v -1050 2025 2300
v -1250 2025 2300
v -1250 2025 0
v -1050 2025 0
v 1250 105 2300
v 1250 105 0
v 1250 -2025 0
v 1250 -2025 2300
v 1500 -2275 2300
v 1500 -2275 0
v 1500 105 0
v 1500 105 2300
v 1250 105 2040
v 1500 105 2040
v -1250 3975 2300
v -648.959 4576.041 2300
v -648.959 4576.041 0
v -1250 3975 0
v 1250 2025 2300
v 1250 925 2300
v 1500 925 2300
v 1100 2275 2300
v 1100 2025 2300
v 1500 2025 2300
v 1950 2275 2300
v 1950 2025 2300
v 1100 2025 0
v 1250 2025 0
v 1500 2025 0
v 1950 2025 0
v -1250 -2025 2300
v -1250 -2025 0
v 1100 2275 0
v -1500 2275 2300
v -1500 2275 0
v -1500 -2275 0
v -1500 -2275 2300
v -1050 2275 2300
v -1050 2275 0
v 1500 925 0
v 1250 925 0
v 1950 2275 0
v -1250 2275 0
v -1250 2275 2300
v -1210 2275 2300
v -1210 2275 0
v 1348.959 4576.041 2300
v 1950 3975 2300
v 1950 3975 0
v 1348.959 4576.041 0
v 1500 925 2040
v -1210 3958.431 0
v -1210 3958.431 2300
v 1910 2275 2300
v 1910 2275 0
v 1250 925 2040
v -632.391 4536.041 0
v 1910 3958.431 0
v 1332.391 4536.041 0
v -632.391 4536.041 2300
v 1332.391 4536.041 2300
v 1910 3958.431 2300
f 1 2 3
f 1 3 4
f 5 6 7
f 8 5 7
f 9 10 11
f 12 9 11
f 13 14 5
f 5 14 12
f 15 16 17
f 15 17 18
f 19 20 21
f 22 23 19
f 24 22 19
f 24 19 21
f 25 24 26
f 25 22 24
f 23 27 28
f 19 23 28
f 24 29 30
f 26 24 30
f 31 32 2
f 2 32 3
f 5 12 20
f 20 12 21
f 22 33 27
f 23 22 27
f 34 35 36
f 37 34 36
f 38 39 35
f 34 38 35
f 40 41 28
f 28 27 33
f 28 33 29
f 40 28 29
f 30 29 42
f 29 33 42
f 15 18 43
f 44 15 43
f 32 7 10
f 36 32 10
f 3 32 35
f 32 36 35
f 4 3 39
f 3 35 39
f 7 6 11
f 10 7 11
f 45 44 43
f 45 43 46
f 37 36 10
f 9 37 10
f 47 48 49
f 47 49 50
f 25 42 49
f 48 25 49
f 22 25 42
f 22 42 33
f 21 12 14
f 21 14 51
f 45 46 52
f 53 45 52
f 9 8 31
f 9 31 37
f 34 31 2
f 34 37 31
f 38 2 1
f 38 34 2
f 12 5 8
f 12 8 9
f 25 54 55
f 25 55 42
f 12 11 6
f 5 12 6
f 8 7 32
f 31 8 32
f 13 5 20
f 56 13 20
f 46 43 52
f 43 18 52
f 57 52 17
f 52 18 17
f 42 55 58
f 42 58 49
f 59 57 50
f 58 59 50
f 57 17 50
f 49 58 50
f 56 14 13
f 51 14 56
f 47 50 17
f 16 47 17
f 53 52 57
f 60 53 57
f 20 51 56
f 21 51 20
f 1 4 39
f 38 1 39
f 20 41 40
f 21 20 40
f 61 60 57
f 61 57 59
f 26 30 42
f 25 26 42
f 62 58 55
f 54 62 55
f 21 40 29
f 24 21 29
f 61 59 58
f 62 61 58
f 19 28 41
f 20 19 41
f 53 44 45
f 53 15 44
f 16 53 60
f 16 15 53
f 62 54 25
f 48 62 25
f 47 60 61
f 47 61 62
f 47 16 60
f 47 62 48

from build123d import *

# Parameters (mm, degrees)
F1_DEPTH = 2300
F2_W     = 820
F2_H     = 260
F3_DEPTH = 250
F4_DEPTH = 2300


with BuildPart() as f1:
    # F0 (on Top) → F1 (new body)
    with BuildSketch(Plane.XY):
        Polygon((-1250, -2025), (-1250, 2025), (-1050, 2025), (-1050, 2275), (-1210, 2275), (-1250, 2275), (-1500, 2275), (-1500, -2275), (1500, -2275), (1500, 105), (1250, 105), (1250, -2025), align=None)
        Polygon((1100, 2275), (1100, 2025), (1250, 2025), (1250, 925), (1500, 925), (1500, 2025), (1950, 2025), (1950, 2275), (1910, 2275), (1500, 2275), align=None)
    extrude(amount=F1_DEPTH)


with BuildPart() as f3:
    # F2 (on face) → F3 (new body, through all)
    with BuildSketch(Plane.YZ.offset(1500)):
        with Locations((515, 2170)):
            Rectangle(F2_W, F2_H)
    extrude(amount=-F3_DEPTH)


with BuildPart() as f4:
    # F0 (on Top) → F4 (new body)
    with BuildSketch(Plane.XY):
        Polygon((-1250, 2275), (-1210, 2275), (-1210, 3958.431458), (-632.390693, 4536.040764), (1332.390693, 4536.040764), (1910, 3958.431458), (1910, 2275), (1950, 2275), (1950, 3975), (1348.959236, 4576.040764), (-648.959236, 4576.040764), (-1250, 3975), align=None)
    extrude(amount=F4_DEPTH)


solid = Compound([f1.part, f3.part, f4.part])
